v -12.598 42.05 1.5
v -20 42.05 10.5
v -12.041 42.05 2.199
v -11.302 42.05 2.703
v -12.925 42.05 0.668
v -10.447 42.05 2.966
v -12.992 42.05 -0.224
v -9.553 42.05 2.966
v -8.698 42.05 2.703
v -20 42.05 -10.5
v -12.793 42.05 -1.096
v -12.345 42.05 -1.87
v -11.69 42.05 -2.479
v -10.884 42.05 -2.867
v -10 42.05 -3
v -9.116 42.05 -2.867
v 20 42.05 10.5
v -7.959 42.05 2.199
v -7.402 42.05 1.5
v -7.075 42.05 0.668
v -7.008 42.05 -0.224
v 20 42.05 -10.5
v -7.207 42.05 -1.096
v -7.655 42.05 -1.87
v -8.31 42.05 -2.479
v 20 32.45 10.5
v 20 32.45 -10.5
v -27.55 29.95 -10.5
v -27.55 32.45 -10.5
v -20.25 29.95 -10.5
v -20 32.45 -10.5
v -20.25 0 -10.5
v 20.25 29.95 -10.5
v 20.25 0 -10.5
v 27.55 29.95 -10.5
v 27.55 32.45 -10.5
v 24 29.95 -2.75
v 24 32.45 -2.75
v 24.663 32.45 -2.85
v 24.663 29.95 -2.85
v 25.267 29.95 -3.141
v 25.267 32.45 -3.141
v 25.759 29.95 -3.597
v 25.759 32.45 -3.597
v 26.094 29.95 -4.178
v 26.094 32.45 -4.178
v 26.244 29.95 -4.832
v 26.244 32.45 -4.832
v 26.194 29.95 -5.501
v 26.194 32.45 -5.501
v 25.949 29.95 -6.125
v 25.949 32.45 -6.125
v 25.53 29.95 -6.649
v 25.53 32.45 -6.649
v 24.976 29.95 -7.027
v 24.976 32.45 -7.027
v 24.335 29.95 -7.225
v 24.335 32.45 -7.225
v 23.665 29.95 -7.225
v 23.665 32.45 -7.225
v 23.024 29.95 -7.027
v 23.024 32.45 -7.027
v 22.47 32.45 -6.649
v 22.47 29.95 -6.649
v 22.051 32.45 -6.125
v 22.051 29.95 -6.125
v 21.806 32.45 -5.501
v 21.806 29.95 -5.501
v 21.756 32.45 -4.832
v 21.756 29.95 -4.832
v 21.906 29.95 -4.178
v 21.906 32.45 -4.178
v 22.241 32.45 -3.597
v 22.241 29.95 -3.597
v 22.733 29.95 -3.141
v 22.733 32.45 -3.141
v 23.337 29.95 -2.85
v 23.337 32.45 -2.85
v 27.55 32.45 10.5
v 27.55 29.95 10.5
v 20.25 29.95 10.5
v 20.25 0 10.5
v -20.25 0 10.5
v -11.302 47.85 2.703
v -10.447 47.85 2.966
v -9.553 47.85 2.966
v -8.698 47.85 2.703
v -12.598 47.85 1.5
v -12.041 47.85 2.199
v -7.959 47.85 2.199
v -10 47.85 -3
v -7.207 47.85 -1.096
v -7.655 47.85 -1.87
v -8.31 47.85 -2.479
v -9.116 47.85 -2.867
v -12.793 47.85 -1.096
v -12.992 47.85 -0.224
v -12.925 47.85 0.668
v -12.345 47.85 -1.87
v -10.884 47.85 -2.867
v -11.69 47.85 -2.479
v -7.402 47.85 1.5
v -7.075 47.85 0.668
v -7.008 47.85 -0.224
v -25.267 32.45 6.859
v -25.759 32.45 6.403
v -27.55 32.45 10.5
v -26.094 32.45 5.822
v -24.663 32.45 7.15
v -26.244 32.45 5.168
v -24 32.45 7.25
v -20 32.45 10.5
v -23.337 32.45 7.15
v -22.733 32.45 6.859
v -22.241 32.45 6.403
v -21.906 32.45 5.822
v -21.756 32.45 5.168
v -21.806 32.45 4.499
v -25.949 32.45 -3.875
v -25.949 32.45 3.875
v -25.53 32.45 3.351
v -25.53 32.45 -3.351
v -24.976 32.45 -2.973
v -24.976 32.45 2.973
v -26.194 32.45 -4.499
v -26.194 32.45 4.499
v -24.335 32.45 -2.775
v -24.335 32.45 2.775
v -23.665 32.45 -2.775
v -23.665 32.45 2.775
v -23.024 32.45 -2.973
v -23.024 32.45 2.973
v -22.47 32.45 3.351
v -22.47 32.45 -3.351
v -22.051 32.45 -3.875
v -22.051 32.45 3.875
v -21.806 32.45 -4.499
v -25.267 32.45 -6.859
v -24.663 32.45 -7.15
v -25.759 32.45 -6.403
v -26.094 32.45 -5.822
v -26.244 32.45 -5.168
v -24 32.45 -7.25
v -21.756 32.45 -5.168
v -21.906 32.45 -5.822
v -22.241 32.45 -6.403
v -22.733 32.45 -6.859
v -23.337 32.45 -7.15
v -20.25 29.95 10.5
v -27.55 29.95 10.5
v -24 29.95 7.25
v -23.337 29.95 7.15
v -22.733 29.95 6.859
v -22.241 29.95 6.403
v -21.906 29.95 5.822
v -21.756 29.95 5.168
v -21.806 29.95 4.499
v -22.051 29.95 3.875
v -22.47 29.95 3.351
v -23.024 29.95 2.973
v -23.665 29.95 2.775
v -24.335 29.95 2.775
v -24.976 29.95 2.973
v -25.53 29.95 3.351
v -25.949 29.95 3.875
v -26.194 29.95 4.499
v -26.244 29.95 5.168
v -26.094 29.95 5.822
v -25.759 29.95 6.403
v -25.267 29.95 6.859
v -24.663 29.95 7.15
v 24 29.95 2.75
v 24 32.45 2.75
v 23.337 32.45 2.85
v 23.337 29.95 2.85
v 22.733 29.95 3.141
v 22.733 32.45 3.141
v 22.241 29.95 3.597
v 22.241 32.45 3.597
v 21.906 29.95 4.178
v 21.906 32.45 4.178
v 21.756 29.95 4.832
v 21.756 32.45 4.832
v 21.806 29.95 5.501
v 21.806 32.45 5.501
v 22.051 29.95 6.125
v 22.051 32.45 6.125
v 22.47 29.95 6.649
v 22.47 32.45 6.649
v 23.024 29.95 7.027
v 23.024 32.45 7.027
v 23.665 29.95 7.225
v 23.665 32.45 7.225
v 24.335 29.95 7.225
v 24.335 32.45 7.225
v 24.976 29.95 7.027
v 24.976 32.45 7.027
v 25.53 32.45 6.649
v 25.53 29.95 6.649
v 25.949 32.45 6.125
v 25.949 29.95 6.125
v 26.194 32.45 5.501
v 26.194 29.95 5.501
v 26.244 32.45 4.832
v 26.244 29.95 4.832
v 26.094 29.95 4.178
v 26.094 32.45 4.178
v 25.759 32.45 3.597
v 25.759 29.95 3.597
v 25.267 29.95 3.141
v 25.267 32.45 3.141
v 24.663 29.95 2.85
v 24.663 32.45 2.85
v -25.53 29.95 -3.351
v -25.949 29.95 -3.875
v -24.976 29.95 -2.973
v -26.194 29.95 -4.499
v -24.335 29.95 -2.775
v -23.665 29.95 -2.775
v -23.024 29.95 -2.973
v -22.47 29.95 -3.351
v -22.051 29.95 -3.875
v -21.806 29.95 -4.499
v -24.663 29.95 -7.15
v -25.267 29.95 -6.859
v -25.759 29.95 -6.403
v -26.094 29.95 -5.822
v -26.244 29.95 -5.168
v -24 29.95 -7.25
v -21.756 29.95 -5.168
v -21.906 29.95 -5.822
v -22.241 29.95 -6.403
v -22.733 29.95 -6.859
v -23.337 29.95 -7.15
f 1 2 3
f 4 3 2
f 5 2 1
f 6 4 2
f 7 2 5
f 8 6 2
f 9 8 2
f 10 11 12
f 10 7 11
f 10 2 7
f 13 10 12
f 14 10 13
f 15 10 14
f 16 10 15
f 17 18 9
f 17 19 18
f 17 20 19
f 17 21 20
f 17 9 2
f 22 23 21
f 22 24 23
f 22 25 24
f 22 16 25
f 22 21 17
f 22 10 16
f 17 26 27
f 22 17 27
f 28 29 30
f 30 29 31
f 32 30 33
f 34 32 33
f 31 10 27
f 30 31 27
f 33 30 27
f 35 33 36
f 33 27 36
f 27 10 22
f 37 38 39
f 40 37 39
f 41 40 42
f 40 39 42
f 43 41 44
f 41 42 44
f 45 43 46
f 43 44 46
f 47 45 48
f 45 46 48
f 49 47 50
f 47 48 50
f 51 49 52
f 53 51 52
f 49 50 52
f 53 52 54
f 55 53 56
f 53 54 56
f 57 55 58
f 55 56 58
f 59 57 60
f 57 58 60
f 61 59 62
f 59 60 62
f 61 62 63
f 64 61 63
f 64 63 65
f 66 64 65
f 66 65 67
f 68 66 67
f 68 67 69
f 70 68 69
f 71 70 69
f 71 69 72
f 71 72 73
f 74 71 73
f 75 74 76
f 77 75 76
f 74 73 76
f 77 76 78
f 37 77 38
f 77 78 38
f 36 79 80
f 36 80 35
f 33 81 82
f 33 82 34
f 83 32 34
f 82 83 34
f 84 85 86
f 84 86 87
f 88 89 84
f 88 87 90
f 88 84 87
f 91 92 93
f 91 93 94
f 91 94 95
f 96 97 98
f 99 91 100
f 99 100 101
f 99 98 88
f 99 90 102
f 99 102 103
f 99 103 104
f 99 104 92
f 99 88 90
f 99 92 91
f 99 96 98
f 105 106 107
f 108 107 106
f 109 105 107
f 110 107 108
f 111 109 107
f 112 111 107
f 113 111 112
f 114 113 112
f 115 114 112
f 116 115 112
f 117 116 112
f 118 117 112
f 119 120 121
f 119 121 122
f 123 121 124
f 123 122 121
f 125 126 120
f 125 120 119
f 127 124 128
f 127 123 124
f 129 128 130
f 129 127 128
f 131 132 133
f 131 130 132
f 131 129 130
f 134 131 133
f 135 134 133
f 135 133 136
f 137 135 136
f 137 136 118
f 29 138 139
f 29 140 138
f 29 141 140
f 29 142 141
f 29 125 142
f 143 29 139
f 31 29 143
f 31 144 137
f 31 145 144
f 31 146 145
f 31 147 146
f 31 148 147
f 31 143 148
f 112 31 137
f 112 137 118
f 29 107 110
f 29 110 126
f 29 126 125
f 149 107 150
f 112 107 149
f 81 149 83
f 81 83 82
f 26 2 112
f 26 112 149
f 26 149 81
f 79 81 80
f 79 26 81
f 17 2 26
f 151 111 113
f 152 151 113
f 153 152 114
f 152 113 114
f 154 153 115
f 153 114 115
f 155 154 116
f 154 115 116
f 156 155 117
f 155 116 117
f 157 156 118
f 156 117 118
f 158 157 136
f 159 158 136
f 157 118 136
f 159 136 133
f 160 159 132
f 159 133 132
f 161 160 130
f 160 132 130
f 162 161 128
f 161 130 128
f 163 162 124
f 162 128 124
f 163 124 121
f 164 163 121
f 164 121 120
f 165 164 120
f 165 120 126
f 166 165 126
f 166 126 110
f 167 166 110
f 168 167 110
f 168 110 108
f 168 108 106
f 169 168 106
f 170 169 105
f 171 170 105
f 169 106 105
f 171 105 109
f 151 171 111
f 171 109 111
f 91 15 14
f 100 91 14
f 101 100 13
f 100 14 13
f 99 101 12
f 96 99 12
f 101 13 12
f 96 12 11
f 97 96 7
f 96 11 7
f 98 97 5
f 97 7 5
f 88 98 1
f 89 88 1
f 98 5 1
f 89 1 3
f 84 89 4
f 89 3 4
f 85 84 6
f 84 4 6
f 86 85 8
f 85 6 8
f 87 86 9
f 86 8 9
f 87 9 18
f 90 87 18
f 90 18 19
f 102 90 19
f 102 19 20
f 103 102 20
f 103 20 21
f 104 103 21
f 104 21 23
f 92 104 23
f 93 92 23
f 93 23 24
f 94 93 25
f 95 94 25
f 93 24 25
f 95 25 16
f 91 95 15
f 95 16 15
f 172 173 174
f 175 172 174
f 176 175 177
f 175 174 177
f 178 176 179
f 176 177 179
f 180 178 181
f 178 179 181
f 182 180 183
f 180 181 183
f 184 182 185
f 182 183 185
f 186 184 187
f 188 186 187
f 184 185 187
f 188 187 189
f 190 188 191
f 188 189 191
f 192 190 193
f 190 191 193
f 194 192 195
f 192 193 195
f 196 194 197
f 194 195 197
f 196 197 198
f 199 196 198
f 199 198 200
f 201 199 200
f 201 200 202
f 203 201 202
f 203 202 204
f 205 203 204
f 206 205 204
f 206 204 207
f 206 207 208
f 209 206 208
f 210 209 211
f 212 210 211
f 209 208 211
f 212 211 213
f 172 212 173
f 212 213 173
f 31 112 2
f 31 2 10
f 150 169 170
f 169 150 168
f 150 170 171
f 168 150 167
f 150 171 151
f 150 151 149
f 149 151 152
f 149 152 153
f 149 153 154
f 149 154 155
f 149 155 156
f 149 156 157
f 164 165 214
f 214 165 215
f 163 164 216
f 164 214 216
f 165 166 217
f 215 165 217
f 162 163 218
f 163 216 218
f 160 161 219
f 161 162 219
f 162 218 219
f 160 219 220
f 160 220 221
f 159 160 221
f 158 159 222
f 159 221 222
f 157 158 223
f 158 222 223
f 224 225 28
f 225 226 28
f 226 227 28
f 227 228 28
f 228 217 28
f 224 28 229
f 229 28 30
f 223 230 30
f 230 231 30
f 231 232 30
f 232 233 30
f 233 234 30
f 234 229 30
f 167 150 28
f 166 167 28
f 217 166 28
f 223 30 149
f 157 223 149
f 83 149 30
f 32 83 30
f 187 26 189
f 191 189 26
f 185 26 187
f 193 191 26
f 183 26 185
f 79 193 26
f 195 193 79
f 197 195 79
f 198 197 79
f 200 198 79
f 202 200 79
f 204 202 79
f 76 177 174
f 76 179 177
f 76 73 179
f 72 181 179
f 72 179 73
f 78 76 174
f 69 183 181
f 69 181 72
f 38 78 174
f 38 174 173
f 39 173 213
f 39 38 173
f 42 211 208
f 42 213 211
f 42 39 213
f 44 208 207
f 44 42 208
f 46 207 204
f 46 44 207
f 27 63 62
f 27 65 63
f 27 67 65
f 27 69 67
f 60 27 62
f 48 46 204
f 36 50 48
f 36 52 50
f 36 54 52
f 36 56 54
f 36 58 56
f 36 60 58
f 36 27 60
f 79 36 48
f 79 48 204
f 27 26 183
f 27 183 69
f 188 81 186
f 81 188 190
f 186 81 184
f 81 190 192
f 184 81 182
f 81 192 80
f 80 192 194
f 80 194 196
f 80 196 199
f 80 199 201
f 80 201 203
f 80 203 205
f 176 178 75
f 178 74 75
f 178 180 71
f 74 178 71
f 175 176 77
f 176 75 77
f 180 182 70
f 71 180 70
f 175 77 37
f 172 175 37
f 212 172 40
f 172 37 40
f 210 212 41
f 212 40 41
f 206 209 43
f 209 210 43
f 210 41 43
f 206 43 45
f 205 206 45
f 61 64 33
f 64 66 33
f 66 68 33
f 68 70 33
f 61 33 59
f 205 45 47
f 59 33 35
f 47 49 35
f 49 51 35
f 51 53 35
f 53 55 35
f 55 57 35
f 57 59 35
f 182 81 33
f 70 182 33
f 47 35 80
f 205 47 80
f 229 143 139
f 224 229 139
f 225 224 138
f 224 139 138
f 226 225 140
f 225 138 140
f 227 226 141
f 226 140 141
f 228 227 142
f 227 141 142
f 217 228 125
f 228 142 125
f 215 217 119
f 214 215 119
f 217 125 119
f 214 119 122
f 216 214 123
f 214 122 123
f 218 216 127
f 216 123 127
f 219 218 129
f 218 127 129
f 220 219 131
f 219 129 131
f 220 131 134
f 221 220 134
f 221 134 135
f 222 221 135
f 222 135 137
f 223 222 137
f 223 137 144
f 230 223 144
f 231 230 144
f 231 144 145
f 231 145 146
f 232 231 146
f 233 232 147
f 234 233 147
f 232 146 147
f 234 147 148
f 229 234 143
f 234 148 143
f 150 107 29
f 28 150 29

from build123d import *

# Parameters (mm, degrees)
SKETCH_1_W      = 40.5
SKETCH_1_H      = 21
EXTRUDE_1_DEPTH = 32.45
SKETCH_2_W      = 7.3
SKETCH_2_H      = 21
SKETCH_2_R      = 2.25
EXTRUDE_2_DEPTH = 2.5
SKETCH_3_W      = 40
SKETCH_3_H      = 21
EXTRUDE_3_DEPTH = 9.6
SKETCH_4_R      = 3
EXTRUDE_4_DEPTH = 5.8


with BuildPart() as part:
    # 草图1 → 凸台-拉伸1 (new body)
    with BuildSketch(Plane(origin=(0, 0, 0), x_dir=(1, 0, 0), z_dir=(0, 1, 0))):
        Rectangle(SKETCH_1_W, SKETCH_1_H)
    extrude(amount=EXTRUDE_1_DEPTH)

    # 草图2 → 凸台-拉伸2 (add)
    # profile 1 of 2: a face of its own
    with BuildSketch(Plane(origin=(0, 32.45, 0), x_dir=(1, 0, 0), z_dir=(0, 1, 0))):
        with Locations((23.9, 0)):
            Rectangle(SKETCH_2_W, SKETCH_2_H)
        with Locations(Location((24, 5, 0), (0, 0, 270))):
            Circle(SKETCH_2_R, mode=Mode.SUBTRACT)
        with Locations(Location((24, -5, 0), (0, 0, 90))):
            Circle(SKETCH_2_R, mode=Mode.SUBTRACT)
    # profile 2 of 2: a face of its own
    with BuildSketch(Plane(origin=(0, 32.45, 0), x_dir=(1, 0, 0), z_dir=(0, 1, 0))):
        with Locations((-23.9, 0)):
            Rectangle(SKETCH_2_W, SKETCH_2_H)
        with Locations(Location((-24, -5, 0), (0, 0, 270))):
            Circle(SKETCH_2_R, mode=Mode.SUBTRACT)
        with Locations(Location((-24, 5, 0), (0, 0, 90))):
            Circle(SKETCH_2_R, mode=Mode.SUBTRACT)
    extrude(amount=-EXTRUDE_2_DEPTH)

    # 草图3 → 凸台-拉伸3 (add)
    with BuildSketch(Plane(origin=(0, 32.45, 0), x_dir=(1, 0, 0), z_dir=(0, 1, 0))):
        Rectangle(SKETCH_3_W, SKETCH_3_H)
    extrude(amount=EXTRUDE_3_DEPTH)

    # 草图4 → 凸台-拉伸4 (add)
    with BuildSketch(Plane(origin=(0, 42.05, 0), x_dir=(1, 0, 0), z_dir=(0, 1, 0))):
        with Locations(Location((-10, 0, 0), (0, 0, 90))):
            Circle(SKETCH_4_R)
    extrude(amount=EXTRUDE_4_DEPTH)


solid = part.part
